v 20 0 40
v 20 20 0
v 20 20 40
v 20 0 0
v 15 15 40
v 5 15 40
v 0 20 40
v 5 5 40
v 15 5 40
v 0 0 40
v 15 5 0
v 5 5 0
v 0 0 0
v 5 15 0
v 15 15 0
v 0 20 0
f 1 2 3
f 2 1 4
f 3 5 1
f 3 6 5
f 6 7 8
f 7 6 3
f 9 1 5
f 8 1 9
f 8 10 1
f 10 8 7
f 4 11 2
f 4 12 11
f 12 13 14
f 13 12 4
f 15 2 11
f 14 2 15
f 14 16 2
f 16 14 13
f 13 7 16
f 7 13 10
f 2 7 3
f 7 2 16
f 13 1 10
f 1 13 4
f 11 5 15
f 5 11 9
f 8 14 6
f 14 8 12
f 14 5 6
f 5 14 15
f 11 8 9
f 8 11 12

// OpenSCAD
module profile_2020(len=40){
  difference(){
    cube([20,20,len]);
    translate([5,5,-0.1]) cube([10,10,len+0.2]);
  }
}
profile_2020();
